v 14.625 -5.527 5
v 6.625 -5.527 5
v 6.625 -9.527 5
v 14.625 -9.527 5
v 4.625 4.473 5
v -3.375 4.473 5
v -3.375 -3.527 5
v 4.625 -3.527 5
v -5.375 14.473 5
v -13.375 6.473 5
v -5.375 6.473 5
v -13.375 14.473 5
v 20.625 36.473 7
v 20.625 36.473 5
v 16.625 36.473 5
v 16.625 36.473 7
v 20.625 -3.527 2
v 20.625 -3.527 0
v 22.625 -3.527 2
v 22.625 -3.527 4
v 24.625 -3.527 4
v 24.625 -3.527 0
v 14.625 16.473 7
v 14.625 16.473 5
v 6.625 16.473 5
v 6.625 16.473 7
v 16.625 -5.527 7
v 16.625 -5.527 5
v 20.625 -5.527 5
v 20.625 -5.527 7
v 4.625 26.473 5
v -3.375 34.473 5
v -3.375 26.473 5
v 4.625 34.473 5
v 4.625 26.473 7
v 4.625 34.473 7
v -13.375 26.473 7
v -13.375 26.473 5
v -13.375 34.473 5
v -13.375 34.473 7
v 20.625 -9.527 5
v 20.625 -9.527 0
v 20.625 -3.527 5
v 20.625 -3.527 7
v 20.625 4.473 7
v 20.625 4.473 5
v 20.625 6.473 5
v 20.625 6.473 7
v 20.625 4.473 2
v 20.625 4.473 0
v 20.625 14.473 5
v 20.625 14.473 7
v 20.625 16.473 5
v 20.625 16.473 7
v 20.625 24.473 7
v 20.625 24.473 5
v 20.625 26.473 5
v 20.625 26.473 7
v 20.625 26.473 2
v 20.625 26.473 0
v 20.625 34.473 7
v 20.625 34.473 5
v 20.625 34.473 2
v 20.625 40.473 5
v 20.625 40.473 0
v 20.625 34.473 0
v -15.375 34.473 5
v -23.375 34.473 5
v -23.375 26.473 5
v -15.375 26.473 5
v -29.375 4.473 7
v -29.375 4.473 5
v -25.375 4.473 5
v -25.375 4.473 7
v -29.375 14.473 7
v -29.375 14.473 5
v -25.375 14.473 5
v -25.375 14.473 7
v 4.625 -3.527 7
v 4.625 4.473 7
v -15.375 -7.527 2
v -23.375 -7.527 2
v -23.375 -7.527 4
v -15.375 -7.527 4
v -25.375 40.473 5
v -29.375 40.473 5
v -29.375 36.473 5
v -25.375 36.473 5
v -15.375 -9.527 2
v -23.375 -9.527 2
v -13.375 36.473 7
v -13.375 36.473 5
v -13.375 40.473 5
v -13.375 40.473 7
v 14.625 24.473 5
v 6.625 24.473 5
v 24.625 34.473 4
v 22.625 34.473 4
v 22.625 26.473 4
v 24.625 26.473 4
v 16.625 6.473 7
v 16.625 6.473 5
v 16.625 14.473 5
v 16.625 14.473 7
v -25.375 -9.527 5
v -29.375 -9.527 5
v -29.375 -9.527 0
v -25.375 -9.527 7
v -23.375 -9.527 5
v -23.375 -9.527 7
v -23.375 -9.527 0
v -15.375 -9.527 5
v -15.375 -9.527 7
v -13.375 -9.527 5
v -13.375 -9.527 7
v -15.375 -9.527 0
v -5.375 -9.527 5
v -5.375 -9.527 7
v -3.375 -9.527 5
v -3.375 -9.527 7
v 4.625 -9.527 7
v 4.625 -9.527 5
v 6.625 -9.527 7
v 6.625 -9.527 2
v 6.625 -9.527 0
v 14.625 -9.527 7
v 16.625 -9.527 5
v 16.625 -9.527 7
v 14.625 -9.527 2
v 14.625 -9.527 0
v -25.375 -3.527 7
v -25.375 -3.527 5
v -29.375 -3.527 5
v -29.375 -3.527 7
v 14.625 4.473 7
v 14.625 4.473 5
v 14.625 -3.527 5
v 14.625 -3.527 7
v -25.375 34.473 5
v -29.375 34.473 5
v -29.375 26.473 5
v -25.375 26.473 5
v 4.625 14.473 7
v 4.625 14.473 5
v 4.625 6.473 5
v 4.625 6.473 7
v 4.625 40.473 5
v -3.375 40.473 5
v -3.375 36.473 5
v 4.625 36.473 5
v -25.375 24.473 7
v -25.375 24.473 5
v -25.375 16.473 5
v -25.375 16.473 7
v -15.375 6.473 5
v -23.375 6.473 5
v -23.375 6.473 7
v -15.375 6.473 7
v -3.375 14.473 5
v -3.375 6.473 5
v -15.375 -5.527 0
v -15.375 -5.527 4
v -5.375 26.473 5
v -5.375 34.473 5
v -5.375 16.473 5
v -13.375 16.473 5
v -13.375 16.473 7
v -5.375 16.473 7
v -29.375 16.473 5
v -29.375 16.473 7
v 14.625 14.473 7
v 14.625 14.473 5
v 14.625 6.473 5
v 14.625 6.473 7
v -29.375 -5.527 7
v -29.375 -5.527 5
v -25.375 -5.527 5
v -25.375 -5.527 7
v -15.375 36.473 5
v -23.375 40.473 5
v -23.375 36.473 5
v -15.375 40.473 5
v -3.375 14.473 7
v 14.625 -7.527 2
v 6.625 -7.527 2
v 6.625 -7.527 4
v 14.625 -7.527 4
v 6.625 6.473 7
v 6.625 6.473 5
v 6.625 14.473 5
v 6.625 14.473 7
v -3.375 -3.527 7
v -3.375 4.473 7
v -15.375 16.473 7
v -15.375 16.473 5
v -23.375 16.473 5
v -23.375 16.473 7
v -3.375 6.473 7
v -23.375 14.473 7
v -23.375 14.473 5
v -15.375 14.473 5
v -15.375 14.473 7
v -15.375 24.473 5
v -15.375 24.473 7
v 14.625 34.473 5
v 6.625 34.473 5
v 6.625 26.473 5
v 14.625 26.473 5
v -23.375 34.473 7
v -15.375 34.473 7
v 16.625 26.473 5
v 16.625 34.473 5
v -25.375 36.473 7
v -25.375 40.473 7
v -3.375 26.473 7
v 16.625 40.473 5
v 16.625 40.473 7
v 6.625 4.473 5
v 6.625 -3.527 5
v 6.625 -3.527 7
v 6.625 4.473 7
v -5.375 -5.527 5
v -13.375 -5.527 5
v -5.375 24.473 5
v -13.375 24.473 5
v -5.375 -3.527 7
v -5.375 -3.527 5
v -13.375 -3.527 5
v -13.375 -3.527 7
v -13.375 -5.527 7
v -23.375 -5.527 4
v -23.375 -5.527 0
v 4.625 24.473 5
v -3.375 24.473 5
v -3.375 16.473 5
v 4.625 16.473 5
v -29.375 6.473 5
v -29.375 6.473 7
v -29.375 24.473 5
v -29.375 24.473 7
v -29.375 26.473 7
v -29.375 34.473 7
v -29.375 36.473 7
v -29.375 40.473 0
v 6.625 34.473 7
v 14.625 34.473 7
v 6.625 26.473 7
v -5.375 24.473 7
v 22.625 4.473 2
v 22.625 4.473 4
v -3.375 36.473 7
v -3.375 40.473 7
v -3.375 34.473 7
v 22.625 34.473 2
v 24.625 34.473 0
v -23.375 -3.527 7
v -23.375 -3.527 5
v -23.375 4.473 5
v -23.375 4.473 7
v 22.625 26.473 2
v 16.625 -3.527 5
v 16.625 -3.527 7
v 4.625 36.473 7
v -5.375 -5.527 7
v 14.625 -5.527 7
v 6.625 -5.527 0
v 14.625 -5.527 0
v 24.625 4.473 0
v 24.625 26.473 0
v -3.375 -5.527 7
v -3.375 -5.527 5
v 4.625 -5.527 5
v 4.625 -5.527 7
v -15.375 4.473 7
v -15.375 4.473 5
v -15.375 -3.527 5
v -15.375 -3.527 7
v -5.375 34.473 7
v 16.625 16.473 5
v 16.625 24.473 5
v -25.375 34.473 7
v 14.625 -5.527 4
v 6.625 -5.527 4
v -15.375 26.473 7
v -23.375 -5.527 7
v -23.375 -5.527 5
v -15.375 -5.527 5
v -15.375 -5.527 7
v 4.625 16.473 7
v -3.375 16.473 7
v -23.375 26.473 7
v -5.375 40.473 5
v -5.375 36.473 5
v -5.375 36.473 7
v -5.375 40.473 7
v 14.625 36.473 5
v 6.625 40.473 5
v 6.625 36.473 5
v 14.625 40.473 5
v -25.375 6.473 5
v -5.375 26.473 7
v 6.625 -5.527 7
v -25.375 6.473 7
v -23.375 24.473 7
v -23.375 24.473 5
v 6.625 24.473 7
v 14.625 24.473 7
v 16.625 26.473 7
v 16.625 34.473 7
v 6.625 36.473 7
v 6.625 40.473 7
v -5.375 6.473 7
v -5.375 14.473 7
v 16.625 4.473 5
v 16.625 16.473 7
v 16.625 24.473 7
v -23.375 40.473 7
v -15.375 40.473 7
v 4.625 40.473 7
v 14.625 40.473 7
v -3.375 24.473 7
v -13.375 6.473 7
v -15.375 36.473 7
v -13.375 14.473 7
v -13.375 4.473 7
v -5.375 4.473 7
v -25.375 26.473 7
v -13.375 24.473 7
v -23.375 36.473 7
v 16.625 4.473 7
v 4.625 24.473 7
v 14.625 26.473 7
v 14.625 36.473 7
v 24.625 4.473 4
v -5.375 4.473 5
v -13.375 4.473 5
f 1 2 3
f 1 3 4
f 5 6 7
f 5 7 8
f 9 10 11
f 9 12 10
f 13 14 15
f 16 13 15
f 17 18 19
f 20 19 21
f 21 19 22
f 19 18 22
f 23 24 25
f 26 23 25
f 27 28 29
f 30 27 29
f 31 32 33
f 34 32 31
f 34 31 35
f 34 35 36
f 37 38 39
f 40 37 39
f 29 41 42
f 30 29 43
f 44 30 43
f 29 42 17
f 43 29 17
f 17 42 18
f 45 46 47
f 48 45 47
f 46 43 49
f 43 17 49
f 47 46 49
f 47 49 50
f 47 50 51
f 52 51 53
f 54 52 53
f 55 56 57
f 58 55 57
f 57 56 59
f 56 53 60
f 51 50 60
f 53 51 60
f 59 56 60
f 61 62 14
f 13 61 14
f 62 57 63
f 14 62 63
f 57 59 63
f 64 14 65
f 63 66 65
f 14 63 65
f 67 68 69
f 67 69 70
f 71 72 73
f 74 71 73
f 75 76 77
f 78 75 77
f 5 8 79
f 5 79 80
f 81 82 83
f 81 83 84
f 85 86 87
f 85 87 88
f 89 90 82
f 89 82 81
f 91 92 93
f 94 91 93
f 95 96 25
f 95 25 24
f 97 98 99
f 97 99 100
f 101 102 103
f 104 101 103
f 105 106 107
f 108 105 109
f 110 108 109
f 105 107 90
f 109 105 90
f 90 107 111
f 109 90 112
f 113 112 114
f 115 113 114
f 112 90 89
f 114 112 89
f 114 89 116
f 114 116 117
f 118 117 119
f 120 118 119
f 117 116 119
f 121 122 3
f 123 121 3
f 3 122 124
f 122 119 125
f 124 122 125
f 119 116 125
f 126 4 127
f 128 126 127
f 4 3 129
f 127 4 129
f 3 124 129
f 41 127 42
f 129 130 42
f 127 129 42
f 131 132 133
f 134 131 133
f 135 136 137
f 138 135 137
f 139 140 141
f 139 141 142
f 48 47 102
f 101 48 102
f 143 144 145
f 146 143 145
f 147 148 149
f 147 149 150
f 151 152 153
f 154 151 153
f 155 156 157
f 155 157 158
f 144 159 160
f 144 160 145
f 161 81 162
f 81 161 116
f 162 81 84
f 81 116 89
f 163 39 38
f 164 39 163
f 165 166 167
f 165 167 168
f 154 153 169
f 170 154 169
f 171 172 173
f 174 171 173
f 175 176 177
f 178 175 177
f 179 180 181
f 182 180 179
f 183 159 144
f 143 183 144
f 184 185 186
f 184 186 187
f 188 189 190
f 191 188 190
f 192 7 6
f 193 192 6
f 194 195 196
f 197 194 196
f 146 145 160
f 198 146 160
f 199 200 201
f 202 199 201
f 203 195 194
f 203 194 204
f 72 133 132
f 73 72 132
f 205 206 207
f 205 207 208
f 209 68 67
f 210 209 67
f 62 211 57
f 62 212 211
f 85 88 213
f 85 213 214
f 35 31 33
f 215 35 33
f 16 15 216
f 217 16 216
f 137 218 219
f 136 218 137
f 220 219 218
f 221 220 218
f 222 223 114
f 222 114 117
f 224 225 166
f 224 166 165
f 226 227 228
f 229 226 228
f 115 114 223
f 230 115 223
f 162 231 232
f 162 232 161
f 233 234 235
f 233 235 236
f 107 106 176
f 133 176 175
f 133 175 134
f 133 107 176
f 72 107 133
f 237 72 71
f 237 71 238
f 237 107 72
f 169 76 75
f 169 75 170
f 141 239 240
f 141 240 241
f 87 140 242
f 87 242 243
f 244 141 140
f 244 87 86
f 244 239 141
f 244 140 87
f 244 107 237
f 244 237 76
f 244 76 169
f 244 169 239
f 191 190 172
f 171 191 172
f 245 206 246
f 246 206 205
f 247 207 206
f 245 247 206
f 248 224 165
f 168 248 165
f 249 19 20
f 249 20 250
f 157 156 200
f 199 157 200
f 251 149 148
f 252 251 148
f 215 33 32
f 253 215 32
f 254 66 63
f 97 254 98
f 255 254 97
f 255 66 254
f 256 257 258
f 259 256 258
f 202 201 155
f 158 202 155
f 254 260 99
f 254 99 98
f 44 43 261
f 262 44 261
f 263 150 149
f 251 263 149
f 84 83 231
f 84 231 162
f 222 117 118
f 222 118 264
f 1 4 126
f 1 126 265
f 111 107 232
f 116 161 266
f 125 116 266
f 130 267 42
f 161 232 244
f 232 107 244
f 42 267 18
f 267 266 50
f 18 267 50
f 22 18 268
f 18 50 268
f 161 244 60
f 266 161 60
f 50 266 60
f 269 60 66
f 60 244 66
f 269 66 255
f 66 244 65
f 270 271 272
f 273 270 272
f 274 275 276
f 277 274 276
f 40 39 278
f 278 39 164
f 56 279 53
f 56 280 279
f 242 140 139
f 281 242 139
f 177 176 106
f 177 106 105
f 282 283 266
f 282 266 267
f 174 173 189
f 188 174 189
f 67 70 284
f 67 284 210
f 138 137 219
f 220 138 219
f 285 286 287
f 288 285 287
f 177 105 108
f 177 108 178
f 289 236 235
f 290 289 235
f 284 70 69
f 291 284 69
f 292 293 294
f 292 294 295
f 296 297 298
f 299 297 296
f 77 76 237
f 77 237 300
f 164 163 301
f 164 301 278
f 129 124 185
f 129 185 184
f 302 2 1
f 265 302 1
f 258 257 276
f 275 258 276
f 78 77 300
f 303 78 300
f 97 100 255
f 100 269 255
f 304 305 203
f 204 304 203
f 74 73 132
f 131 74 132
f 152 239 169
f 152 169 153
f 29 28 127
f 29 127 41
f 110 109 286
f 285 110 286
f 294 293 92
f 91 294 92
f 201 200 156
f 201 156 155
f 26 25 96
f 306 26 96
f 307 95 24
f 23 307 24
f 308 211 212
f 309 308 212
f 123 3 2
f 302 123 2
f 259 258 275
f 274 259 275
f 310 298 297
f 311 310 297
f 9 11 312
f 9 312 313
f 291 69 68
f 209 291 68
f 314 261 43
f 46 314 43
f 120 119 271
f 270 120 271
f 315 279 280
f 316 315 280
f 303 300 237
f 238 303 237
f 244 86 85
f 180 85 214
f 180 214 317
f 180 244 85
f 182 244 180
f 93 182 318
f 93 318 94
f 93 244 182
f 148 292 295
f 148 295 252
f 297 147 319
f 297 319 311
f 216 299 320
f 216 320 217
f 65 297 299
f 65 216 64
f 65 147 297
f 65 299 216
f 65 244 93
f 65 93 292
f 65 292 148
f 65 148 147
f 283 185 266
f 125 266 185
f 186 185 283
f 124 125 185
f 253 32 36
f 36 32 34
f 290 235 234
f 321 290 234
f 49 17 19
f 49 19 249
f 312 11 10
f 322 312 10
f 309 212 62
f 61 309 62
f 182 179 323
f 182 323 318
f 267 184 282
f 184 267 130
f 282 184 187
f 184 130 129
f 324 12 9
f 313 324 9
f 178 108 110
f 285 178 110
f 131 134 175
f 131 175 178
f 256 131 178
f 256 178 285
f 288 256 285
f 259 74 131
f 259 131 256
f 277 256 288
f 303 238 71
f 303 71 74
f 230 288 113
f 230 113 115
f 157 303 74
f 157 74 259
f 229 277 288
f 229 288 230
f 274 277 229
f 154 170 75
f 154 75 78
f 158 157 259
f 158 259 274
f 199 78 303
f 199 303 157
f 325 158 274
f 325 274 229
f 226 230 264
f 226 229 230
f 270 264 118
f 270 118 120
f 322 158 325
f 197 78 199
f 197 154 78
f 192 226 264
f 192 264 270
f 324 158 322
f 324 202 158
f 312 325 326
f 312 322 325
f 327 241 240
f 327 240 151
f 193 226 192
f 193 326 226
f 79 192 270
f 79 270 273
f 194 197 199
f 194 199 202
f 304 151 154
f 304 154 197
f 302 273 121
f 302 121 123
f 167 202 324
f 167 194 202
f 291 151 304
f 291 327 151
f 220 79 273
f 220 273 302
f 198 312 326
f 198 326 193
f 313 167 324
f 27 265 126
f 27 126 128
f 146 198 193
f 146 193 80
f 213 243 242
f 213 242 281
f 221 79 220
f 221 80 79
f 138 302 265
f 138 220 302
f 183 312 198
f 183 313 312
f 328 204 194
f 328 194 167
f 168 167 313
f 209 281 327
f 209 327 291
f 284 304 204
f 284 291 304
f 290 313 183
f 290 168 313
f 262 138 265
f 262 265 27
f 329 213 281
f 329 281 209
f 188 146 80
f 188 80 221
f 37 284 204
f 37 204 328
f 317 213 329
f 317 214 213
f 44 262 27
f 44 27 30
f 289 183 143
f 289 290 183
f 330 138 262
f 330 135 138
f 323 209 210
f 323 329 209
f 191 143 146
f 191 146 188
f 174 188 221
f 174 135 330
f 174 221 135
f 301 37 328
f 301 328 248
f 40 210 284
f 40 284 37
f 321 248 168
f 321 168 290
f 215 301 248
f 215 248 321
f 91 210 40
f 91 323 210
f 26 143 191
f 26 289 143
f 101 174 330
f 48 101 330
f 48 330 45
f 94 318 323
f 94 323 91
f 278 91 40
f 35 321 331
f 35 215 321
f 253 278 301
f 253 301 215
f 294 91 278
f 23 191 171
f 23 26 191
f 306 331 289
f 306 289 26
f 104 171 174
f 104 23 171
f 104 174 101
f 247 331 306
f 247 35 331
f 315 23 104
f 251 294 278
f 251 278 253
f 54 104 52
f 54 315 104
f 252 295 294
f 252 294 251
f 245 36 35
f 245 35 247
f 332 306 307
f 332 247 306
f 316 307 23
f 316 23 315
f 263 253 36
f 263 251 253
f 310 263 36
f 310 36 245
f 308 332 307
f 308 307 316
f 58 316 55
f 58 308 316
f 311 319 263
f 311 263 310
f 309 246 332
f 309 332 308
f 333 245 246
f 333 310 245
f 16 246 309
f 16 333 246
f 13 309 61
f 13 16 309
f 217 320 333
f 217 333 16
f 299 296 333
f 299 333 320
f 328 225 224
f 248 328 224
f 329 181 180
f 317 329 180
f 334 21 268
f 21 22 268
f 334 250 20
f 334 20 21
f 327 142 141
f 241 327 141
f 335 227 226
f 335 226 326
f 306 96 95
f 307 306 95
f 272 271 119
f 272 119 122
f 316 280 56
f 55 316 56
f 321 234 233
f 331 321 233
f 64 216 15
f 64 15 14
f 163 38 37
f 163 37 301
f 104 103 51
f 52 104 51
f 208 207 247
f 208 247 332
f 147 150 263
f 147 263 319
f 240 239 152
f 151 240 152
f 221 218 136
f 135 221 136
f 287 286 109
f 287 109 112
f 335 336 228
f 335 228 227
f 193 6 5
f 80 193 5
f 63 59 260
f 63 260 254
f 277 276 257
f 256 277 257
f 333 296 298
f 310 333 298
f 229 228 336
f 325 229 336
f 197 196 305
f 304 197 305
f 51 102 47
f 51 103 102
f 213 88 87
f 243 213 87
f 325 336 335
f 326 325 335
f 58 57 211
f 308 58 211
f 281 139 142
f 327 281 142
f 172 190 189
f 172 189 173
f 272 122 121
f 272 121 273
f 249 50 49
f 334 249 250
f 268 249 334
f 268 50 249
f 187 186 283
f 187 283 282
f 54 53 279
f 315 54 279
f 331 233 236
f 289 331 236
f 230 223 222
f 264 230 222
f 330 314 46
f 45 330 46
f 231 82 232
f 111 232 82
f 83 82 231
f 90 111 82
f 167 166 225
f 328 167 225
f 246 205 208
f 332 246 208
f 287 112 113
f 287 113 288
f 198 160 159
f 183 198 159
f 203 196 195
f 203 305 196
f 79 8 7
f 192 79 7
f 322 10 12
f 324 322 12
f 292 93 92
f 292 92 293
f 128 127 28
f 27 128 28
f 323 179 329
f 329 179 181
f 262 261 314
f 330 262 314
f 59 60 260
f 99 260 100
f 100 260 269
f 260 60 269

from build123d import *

# Parameters (mm, degrees)
F0_W      = 50
F0_H      = 50
F1_DEPTH  = 5
F2_W      = 4
F2_H      = 2
F2_W_2    = 2
F2_H_2    = 4
F2_W_3    = 8
F2_H_3    = 8
F4_DEPTH  = 2
F3_W      = 8
F3_H      = 2
F5_DEPTH  = 4
F6_W      = 8
F6_H      = 2
F7_DEPTH  = 4
F8_W      = 2
F8_H      = 8
F9_DEPTH  = 2
F10_W     = 2
F10_H     = 8
F11_DEPTH = 2
F12_W     = 8
F12_H     = 2
F13_DEPTH = 2
F14_W     = 8
F14_H     = 2
F15_DEPTH = 2


with BuildPart() as f1:
    # F0 (on Top) → F1 (new body)
    with BuildSketch(Plane.XY):
        with Locations((-4.374999553, 15.4727034503)):
            Rectangle(F0_W, F0_H)
    extrude(amount=F1_DEPTH)

    # F2 (on face) → F4 (join)
    with BuildSketch(Plane.XY.offset(5)):
        with Locations((-27.374999553, -4.5272965497)):
            Rectangle(F2_W, F2_H)
        with Locations((-24.374999553, -4.5272965497)):
            Rectangle(F2_W_2, F2_H)
        with Locations((-24.374999553, -7.5272965497)):
            Rectangle(F2_W_2, F2_H_2)
        with Locations((-19.374999553, -4.5272965497)):
            Rectangle(F2_W_3, F2_H)
        with Locations((-24.374999553, 0.4727034503)):
            Rectangle(F2_W_2, F2_H_3)
        with Locations((-14.374999553, -4.5272965497)):
            Rectangle(F2_W_2, F2_H)
        with Locations((-14.374999553, -7.5272965497)):
            Rectangle(F2_W_2, F2_H_2)
        with Locations((-24.374999553, 5.4727034503)):
            Rectangle(F2_W_2, F2_H)
        with Locations((-27.374999553, 5.4727034503)):
            Rectangle(F2_W, F2_H)
        with Locations((-9.374999553, -4.5272965497)):
            Rectangle(F2_W_3, F2_H)
        with Locations((-24.374999553, 10.4727034503)):
            Rectangle(F2_W_2, F2_H_3)
        with Locations((-4.374999553, -4.5272965497)):
            Rectangle(F2_W_2, F2_H)
        with Locations((-4.374999553, -7.5272965497)):
            Rectangle(F2_W_2, F2_H_2)
        with Locations((-24.374999553, 15.4727034503)):
            Rectangle(F2_W_2, F2_H)
        with Locations((-27.374999553, 15.4727034503)):
            Rectangle(F2_W, F2_H)
        with Locations((0.625000447, -4.5272965497)):
            Rectangle(F2_W_3, F2_H)
        with Locations((-24.374999553, 20.4727034503)):
            Rectangle(F2_W_2, F2_H_3)
        with Locations((5.625000447, -4.5272965497)):
            Rectangle(F2_W_2, F2_H)
        with Locations((5.625000447, -7.5272965497)):
            Rectangle(F2_W_2, F2_H_2)
        with Locations((-24.374999553, 25.4727034503)):
            Rectangle(F2_W_2, F2_H)
        with Locations((-27.374999553, 25.4727034503)):
            Rectangle(F2_W, F2_H)
        with Locations((10.625000447, -4.5272965497)):
            Rectangle(F2_W_3, F2_H)
        with Locations((-24.374999553, 30.4727034503)):
            Rectangle(F2_W_2, F2_H_3)
        with Locations((15.625000447, -4.5272965497)):
            Rectangle(F2_W_2, F2_H)
        with Locations((15.625000447, -7.5272965497)):
            Rectangle(F2_W_2, F2_H_2)
        with Locations((-24.374999553, 35.4727034503)):
            Rectangle(F2_W_2, F2_H)
        with Locations((-27.374999553, 35.4727034503)):
            Rectangle(F2_W, F2_H)
        with Locations((18.625000447, -4.5272965497)):
            Rectangle(F2_W, F2_H)
        with Locations((15.625000447, 0.4727034503)):
            Rectangle(F2_W_2, F2_H_3)
        with Locations((-19.374999553, 35.4727034503)):
            Rectangle(F2_W_3, F2_H)
        with Locations((-24.374999553, 38.4727034503)):
            Rectangle(F2_W_2, F2_H_2)
        with Locations((15.625000447, 5.4727034503)):
            Rectangle(F2_W_2, F2_H)
        with Locations((-14.374999553, 35.4727034503)):
            Rectangle(F2_W_2, F2_H)
        with Locations((18.625000447, 5.4727034503)):
            Rectangle(F2_W, F2_H)
        with Locations((15.625000447, 10.4727034503)):
            Rectangle(F2_W_2, F2_H_3)
        with Locations((-9.374999553, 35.4727034503)):
            Rectangle(F2_W_3, F2_H)
        with Locations((-14.374999553, 38.4727034503)):
            Rectangle(F2_W_2, F2_H_2)
        with Locations((15.625000447, 15.4727034503)):
            Rectangle(F2_W_2, F2_H)
        with Locations((-4.374999553, 35.4727034503)):
            Rectangle(F2_W_2, F2_H)
        with Locations((18.625000447, 15.4727034503)):
            Rectangle(F2_W, F2_H)
        with Locations((15.625000447, 20.4727034503)):
            Rectangle(F2_W_2, F2_H_3)
        with Locations((0.625000447, 35.4727034503)):
            Rectangle(F2_W_3, F2_H)
        with Locations((-4.374999553, 38.4727034503)):
            Rectangle(F2_W_2, F2_H_2)
        with Locations((15.625000447, 25.4727034503)):
            Rectangle(F2_W_2, F2_H)
        with Locations((5.625000447, 35.4727034503)):
            Rectangle(F2_W_2, F2_H)
        with Locations((18.625000447, 25.4727034503)):
            Rectangle(F2_W, F2_H)
        with Locations((15.625000447, 30.4727034503)):
            Rectangle(F2_W_2, F2_H_3)
        with Locations((10.625000447, 35.4727034503)):
            Rectangle(F2_W_3, F2_H)
        with Locations((5.625000447, 38.4727034503)):
            Rectangle(F2_W_2, F2_H_2)
        with Locations((15.625000447, 35.4727034503)):
            Rectangle(F2_W_2, F2_H)
        with Locations((18.625000447, 35.4727034503)):
            Rectangle(F2_W, F2_H)
        with Locations((15.625000447, 38.4727034503)):
            Rectangle(F2_W_2, F2_H_2)
        with Locations((-14.374999553, 0.4727034503)):
            Rectangle(F2_W_2, F2_H_3)
        with Locations((-14.374999553, 5.4727034503)):
            Rectangle(F2_W_2, F2_H)
        with Locations((-9.374999553, 5.4727034503)):
            Rectangle(F2_W_3, F2_H)
        with Locations((-14.374999553, 10.4727034503)):
            Rectangle(F2_W_2, F2_H_3)
        with Locations((-14.374999553, 15.4727034503)):
            Rectangle(F2_W_2, F2_H)
        with Locations((-19.374999553, 15.4727034503)):
            Rectangle(F2_W_3, F2_H)
        with Locations((-19.374999553, 25.4727034503)):
            Rectangle(F2_W_3, F2_H)
        with Locations((-14.374999553, 25.4727034503)):
            Rectangle(F2_W_2, F2_H)
        with Locations((-14.374999553, 30.4727034503)):
            Rectangle(F2_W_2, F2_H_3)
        with Locations((-14.374999553, 20.4727034503)):
            Rectangle(F2_W_2, F2_H_3)
        with Locations((-9.374999553, 25.4727034503)):
            Rectangle(F2_W_3, F2_H)
        with Locations((-4.374999553, 20.4727034503)):
            Rectangle(F2_W_2, F2_H_3)
        with Locations((-4.374999553, 15.4727034503)):
            Rectangle(F2_W_2, F2_H)
        with Locations((-9.374999553, 15.4727034503)):
            Rectangle(F2_W_3, F2_H)
        with Locations((-4.374999553, 10.4727034503)):
            Rectangle(F2_W_2, F2_H_3)
        with Locations((-4.374999553, 5.4727034503)):
            Rectangle(F2_W_2, F2_H)
        with Locations((-4.374999553, 0.4727034503)):
            Rectangle(F2_W_2, F2_H_3)
        with Locations((0.625000447, 5.4727034503)):
            Rectangle(F2_W_3, F2_H)
        with Locations((5.625000447, 0.4727034503)):
            Rectangle(F2_W_2, F2_H_3)
        with Locations((5.625000447, 5.4727034503)):
            Rectangle(F2_W_2, F2_H)
        with Locations((10.625000447, 5.4727034503)):
            Rectangle(F2_W_3, F2_H)
        with Locations((5.625000447, 10.4727034503)):
            Rectangle(F2_W_2, F2_H_3)
        with Locations((10.625000447, 15.4727034503)):
            Rectangle(F2_W_3, F2_H)
        with Locations((5.625000447, 15.4727034503)):
            Rectangle(F2_W_2, F2_H)
        with Locations((0.625000447, 15.4727034503)):
            Rectangle(F2_W_3, F2_H)
        with Locations((5.625000447, 20.4727034503)):
            Rectangle(F2_W_2, F2_H_3)
        with Locations((5.625000447, 25.4727034503)):
            Rectangle(F2_W_2, F2_H)
        with Locations((0.625000447, 25.4727034503)):
            Rectangle(F2_W_3, F2_H)
        with Locations((-4.374999553, 30.4727034503)):
            Rectangle(F2_W_2, F2_H_3)
        with Locations((-4.374999553, 25.4727034503)):
            Rectangle(F2_W_2, F2_H)
        with Locations((5.625000447, 30.4727034503)):
            Rectangle(F2_W_2, F2_H_3)
        with Locations((10.625000447, 25.4727034503)):
            Rectangle(F2_W_3, F2_H)
        with Locations((-19.374999553, 5.4727034503)):
            Rectangle(F2_W_3, F2_H)
    extrude(amount=F4_DEPTH)

    # F3 (on face) → F5 (cut)
    with BuildSketch(Plane.XZ.offset(9.5272965497)):
        with Locations((-19.374999553, 1)):
            Rectangle(F3_W, F3_H)
        with Locations((10.625000447, 1)):
            Rectangle(F3_W, F3_H)
    extrude(amount=-F5_DEPTH, mode=Mode.SUBTRACT)

    # F6 (on face) → F7 (join)
    with BuildSketch(Plane.YZ.offset(20.625000447)):
        with Locations((0.4727034503, 1)):
            Rectangle(F6_W, F6_H)
        with Locations((30.4727034503, 1)):
            Rectangle(F6_W, F6_H)
    extrude(amount=F7_DEPTH)

    # F8 (on face) → F9 (join)
    with BuildSketch(Plane.XY.offset(2)):
        with Locations((23.625000447, 30.4727034503)):
            Rectangle(F8_W, F8_H)
    extrude(amount=F9_DEPTH)

    # F10 (on face) → F11 (join)
    with BuildSketch(Plane.XY.offset(2)):
        with Locations((23.625000447, 0.4727034503)):
            Rectangle(F10_W, F10_H)
    extrude(amount=F11_DEPTH)

    # F12 (on face) → F13 (cut)
    with BuildSketch(Plane(origin=(0, 0, 2), x_dir=(1, 0, 0), z_dir=(0, 0, -1))):
        with Locations((10.625000447, 6.5272965497)):
            Rectangle(F12_W, F12_H)
    extrude(amount=-F13_DEPTH, mode=Mode.SUBTRACT)

    # F14 (on face) → F15 (cut)
    with BuildSketch(Plane(origin=(0, 0, 2), x_dir=(1, 0, 0), z_dir=(0, 0, -1))):
        with Locations((-19.374999553, 6.5272965497)):
            Rectangle(F14_W, F14_H)
    extrude(amount=-F15_DEPTH, mode=Mode.SUBTRACT)


solid = f1.part
